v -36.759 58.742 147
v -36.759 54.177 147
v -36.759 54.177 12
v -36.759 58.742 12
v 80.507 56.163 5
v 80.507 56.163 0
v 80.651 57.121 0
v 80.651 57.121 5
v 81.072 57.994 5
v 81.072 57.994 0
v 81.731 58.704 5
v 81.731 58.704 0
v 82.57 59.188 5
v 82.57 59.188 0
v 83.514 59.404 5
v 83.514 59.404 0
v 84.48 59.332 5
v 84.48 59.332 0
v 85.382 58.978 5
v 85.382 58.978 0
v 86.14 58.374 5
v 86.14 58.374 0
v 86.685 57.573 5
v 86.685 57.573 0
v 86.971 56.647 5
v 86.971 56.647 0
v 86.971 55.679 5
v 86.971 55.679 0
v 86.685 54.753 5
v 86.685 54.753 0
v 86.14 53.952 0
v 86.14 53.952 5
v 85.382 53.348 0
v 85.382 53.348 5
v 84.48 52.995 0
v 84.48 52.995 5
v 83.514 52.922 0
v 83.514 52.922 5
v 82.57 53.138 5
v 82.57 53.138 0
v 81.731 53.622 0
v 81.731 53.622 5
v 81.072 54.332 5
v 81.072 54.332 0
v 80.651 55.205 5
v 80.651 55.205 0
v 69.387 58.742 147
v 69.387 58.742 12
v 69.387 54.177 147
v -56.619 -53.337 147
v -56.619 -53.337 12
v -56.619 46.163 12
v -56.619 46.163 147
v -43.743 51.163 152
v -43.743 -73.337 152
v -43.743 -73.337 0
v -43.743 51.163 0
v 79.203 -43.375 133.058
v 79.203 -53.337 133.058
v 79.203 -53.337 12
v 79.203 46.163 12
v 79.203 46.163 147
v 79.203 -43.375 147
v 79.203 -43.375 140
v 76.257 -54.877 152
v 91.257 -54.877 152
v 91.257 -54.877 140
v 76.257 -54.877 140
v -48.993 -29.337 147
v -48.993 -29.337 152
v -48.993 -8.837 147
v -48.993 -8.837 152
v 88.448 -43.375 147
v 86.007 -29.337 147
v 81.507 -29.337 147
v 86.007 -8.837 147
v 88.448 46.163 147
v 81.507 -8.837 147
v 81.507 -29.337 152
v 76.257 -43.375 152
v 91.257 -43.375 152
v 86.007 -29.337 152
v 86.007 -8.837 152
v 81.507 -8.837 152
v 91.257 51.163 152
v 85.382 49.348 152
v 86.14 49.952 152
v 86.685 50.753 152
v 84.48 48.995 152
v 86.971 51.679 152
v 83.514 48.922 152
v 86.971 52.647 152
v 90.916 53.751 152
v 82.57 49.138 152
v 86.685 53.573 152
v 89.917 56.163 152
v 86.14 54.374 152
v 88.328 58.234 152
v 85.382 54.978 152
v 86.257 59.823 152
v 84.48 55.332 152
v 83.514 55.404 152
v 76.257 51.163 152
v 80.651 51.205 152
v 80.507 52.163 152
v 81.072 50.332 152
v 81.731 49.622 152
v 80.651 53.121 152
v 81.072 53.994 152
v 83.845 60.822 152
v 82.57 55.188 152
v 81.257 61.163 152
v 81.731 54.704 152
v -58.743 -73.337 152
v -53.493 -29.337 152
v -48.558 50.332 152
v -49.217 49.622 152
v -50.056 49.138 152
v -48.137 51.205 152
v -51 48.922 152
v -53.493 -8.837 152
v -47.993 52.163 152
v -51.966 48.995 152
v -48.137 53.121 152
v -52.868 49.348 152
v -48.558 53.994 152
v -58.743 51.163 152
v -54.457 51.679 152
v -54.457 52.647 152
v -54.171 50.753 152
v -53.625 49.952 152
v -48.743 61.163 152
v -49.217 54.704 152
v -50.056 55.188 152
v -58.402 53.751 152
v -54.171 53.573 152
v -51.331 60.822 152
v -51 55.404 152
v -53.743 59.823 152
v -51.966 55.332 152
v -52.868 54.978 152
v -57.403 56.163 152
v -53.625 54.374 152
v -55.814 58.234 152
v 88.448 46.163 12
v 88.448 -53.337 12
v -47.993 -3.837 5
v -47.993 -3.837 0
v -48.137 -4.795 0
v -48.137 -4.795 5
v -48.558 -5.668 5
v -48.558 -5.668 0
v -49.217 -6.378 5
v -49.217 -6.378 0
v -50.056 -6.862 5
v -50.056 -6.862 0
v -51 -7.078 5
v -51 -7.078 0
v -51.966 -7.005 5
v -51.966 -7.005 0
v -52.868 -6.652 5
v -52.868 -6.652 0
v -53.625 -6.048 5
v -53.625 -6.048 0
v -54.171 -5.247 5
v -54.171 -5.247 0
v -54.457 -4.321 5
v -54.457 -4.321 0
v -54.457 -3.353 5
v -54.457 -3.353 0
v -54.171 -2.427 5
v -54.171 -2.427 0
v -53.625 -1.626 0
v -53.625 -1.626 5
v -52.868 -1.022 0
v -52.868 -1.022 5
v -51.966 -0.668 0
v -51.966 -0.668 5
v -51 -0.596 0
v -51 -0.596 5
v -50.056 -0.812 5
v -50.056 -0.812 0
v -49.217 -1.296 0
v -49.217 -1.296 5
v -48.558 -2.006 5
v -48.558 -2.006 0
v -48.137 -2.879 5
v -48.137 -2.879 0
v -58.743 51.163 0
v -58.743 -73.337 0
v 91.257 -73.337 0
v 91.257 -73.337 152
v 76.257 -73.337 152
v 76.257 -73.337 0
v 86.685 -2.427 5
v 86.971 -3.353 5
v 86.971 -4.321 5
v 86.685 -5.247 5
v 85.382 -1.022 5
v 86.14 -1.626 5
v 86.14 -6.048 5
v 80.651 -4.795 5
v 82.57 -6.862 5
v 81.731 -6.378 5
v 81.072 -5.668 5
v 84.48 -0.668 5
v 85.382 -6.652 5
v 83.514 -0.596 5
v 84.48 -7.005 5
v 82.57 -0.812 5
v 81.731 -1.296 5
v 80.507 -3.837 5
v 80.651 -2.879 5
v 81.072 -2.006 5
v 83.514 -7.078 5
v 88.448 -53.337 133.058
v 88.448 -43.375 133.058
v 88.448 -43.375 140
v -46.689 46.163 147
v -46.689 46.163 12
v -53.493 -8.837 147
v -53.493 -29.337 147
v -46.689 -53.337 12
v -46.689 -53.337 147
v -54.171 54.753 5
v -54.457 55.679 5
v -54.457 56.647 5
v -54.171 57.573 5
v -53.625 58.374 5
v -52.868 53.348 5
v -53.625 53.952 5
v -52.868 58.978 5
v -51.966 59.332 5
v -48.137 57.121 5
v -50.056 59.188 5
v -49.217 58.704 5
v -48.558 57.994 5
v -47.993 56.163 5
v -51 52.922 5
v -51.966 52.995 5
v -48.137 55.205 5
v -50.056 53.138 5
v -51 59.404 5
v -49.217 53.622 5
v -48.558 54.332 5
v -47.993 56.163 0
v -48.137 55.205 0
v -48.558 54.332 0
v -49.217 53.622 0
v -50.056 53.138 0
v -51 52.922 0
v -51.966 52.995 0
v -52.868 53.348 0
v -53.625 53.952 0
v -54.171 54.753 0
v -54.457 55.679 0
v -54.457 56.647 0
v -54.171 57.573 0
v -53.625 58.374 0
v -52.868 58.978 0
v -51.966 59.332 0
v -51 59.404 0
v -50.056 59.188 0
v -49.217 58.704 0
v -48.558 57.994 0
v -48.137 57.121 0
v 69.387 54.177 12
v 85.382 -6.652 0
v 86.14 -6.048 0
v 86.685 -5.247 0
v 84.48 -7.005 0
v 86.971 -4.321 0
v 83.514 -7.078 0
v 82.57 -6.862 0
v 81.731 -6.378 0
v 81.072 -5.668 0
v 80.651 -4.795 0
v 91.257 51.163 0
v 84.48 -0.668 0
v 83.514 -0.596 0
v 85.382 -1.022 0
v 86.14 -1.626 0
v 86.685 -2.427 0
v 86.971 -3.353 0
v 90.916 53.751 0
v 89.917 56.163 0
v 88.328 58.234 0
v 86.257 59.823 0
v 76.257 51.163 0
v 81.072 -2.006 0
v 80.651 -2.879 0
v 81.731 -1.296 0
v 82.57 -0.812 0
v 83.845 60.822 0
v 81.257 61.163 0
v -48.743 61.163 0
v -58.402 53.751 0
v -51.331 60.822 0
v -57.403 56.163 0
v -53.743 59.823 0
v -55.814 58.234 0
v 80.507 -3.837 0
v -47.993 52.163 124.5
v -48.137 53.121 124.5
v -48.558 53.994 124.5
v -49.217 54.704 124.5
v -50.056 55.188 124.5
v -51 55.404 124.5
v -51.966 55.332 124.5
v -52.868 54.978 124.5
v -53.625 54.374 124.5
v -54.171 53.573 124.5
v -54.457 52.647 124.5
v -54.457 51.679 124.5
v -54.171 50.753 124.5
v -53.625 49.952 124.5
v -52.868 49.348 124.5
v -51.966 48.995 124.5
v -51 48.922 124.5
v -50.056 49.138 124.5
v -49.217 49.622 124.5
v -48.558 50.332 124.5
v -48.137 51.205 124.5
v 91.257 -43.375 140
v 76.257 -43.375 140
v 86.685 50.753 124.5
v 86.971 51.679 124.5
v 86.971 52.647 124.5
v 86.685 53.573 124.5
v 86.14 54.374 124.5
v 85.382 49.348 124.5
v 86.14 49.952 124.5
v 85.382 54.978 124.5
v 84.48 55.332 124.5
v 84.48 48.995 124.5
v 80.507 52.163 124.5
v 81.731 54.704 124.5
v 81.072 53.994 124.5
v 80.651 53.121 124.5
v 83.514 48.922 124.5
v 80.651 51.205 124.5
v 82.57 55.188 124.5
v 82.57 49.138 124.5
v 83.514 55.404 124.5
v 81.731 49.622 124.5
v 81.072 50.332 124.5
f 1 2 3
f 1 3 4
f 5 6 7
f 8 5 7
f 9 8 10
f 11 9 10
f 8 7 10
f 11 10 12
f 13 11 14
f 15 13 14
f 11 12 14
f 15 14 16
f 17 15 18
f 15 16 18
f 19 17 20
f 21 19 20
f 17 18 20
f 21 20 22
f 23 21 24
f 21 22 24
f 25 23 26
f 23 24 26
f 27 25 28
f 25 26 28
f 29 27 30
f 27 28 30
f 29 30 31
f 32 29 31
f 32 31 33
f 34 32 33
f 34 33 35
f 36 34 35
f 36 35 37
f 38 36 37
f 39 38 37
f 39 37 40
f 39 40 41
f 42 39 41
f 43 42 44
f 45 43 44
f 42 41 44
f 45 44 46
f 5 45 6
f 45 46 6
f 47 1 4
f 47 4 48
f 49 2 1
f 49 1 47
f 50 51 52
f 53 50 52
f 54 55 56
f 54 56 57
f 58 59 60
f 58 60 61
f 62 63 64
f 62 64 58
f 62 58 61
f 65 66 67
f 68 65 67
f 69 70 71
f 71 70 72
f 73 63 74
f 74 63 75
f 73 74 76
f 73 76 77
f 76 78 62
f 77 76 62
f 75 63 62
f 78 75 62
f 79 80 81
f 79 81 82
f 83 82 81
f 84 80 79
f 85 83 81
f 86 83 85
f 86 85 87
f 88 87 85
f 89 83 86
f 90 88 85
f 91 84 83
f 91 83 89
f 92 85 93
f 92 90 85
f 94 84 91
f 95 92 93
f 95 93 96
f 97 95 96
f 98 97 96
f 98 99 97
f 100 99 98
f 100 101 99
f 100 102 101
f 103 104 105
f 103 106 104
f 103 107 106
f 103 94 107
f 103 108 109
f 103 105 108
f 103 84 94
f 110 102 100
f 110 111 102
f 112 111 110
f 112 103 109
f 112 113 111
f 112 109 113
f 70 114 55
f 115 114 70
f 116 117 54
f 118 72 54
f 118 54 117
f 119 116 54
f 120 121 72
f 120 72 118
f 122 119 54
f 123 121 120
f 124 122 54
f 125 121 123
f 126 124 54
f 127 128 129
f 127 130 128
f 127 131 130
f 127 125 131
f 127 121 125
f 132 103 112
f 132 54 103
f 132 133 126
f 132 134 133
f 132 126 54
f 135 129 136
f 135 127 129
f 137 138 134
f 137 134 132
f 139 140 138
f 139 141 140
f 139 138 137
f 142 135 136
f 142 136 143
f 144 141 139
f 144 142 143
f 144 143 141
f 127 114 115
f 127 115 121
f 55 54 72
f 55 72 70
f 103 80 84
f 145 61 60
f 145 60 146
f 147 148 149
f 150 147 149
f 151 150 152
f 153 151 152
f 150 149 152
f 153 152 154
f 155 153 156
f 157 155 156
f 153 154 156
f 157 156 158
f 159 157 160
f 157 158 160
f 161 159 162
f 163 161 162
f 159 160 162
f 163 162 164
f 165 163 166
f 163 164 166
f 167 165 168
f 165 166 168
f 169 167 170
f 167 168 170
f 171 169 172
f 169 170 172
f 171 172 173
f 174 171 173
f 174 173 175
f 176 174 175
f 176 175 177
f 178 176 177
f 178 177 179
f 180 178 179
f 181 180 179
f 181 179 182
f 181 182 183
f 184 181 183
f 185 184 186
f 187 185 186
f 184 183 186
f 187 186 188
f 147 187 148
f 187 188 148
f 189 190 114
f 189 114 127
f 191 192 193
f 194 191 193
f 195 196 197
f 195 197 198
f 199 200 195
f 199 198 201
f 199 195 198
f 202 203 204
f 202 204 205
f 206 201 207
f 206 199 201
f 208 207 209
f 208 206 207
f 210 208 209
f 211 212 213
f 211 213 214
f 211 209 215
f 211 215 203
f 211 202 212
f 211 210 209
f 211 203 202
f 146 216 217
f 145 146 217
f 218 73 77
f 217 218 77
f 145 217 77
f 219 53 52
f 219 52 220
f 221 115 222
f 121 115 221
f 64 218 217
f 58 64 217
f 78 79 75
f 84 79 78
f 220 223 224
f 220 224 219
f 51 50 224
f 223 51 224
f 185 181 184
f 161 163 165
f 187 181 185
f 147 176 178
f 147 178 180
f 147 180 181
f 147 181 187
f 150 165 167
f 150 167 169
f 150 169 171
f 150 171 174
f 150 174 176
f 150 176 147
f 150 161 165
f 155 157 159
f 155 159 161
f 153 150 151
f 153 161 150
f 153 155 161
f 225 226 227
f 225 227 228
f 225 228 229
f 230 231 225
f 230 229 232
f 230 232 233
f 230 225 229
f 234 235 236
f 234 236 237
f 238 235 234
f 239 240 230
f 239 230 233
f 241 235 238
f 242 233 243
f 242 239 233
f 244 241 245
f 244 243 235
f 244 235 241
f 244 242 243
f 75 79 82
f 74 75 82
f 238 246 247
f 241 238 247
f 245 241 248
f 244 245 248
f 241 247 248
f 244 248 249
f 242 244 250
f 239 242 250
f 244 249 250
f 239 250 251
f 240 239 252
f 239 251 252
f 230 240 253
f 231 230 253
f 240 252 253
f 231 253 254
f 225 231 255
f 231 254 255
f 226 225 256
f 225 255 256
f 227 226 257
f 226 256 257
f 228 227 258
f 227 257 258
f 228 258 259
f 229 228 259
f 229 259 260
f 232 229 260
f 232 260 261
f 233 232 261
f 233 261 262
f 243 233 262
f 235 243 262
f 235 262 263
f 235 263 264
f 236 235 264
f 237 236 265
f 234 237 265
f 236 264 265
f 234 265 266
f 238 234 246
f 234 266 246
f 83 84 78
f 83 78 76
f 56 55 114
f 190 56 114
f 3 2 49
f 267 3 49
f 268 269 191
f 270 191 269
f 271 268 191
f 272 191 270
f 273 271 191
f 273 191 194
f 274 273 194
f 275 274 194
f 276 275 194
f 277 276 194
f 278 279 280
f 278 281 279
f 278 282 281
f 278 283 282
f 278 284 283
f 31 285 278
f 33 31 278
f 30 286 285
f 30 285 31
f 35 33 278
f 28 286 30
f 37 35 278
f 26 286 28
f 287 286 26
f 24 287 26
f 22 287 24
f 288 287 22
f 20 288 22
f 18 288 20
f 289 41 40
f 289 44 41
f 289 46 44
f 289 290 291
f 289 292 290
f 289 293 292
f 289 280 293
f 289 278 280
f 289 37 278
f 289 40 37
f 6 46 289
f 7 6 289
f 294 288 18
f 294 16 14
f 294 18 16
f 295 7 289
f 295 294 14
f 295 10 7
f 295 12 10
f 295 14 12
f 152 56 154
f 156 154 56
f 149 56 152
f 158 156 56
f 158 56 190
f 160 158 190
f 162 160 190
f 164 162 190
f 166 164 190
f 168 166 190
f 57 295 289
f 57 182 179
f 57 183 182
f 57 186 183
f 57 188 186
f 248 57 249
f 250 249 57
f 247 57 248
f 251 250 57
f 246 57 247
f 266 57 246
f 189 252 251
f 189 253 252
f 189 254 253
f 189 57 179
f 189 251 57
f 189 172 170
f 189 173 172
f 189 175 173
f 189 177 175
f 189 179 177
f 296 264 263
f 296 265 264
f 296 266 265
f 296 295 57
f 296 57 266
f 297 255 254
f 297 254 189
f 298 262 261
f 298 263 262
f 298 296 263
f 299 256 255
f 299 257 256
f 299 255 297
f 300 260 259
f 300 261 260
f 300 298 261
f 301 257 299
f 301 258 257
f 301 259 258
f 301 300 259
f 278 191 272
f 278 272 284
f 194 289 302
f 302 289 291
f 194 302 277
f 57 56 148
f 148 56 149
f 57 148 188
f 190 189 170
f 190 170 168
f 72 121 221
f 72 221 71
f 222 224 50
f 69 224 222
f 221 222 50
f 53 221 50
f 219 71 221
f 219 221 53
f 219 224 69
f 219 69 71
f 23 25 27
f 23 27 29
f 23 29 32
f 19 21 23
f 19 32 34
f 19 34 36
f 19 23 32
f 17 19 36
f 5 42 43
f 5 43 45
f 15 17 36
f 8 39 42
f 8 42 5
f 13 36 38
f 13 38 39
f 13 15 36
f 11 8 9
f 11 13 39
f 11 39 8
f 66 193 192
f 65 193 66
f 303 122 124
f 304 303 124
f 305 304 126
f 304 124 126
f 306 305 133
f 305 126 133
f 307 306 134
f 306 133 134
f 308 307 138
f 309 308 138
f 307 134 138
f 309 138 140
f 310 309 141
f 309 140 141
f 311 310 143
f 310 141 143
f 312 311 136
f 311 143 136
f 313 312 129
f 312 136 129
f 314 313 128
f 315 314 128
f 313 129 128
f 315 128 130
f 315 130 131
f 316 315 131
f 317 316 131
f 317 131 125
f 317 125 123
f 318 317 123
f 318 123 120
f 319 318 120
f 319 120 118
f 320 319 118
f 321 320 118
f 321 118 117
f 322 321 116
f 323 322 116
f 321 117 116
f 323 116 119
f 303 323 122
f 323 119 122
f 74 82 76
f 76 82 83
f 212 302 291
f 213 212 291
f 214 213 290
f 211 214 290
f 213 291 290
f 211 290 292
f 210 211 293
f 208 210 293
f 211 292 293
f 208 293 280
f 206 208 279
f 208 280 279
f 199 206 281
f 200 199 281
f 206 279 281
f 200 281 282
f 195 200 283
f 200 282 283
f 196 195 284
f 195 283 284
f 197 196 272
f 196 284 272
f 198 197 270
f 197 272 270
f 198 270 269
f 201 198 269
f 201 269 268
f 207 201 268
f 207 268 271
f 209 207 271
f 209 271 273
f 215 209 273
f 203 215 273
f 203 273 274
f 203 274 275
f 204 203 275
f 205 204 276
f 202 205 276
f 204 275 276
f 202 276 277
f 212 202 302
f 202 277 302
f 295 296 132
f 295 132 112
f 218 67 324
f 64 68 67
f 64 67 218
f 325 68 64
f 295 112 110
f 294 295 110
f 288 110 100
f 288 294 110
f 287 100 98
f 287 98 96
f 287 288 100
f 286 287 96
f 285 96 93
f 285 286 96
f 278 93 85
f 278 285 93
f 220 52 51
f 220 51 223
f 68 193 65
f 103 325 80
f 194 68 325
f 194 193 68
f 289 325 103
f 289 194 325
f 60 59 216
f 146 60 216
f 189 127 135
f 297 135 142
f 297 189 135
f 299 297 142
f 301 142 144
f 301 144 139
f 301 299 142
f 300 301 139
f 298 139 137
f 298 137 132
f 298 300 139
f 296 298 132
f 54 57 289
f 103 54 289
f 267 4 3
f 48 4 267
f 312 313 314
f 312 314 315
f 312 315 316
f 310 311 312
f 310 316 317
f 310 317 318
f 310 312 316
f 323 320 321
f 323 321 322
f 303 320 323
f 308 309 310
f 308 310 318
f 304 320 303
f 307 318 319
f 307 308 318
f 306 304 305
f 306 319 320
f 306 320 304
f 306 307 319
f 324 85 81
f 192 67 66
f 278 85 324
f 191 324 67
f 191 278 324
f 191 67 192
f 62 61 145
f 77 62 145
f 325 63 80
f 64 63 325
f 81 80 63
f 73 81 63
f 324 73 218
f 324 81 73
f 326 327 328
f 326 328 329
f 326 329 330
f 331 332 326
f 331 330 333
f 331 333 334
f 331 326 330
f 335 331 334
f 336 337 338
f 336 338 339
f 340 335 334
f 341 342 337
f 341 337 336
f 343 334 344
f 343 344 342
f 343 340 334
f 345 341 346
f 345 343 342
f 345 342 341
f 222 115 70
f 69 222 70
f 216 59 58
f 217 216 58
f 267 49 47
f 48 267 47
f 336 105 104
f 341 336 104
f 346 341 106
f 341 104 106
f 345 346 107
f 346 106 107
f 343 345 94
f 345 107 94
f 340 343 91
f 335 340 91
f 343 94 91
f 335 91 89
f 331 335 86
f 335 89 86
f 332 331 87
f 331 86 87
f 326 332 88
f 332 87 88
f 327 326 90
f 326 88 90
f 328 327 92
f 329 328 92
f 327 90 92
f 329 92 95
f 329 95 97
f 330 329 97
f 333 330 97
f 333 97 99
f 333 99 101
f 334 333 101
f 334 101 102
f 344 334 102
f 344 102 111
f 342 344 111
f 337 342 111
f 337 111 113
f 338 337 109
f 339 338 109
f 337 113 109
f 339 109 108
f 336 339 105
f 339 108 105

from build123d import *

# Parameters (mm, degrees)
SKETCH2_W           = 120
SKETCH2_H           = 114.5
BOSS_EXTRUDE1_DEPTH = 152
SKETCH3_R           = 3.25
CUT_EXTRUDE1_DEPTH  = 27.5
SKETCH4_W           = 120
SKETCH4_H           = 10.090135052
CUT_EXTRUDE2_DEPTH  = 192.859758942
SKETCH5_W           = 9.929816524
SKETCH5_H           = 99.5
SKETCH5_W_2         = 106.146314573
SKETCH5_H_2         = 4.565432885
SKETCH5_W_3         = 9.245001591
CUT_EXTRUDE3_DEPTH  = 140
SKETCH6_W           = 5
SKETCH6_H           = 99.5
BOSS_EXTRUDE2_DEPTH = 10
SKETCH7_W           = 106.146314573
SKETCH7_H           = 5
BOSS_EXTRUDE3_DEPTH = 6
SKETCH8_W           = 5
SKETCH8_H           = 99.5
BOSS_EXTRUDE4_DEPTH = 10
SKETCH9_R           = 3.25
CUT_EXTRUDE4_DEPTH  = 5
SKETCH11_W          = 12
SKETCH11_H          = 11.501568892
CUT_EXTRUDE5_DEPTH  = 35
SKETCH12_W          = 6.942410631
SKETCH12_H          = 9.961568892
BOSS_EXTRUDE5_DEPTH = 9.5
SKETCH13_W          = 4.5
SKETCH13_H          = 20.5
CUT_EXTRUDE6_DEPTH  = 15


with BuildPart() as part:
    # Sketch2 → Boss-Extrude1 (new body)
    with BuildSketch(Plane.XY):
        with BuildLine():
            Line((-48.742911668, 61.163031625), (81.257088332, 61.163031625))
            ThreePointArc((81.257088332, 61.163031625), (88.328156143, 58.234099437), (91.257088332, 51.163031625))
            Line((91.257088332, 51.163031625), (91.257088332, -73.336968375))
            Line((91.257088332, -73.336968375), (-58.742911668, -73.336968375))
            Line((-58.742911668, -73.336968375), (-58.742911668, 51.163031625))
            ThreePointArc((-58.742911668, 51.163031625), (-55.81397948, 58.234099437), (-48.742911668, 61.163031625))
        make_face()
        with Locations((16.257088332, -6.086968375)):
            Rectangle(SKETCH2_W, SKETCH2_H, mode=Mode.SUBTRACT)
    extrude(amount=BOSS_EXTRUDE1_DEPTH)

    # Sketch3 → Cut-Extrude1 (cut)
    with BuildSketch(Plane.XY.offset(152)):
        with Locations((-51.242911668, 52.163031625)):
            Circle(SKETCH3_R)
        with Locations((83.757088332, 52.163031625)):
            Circle(SKETCH3_R)
    extrude(amount=-CUT_EXTRUDE1_DEPTH, mode=Mode.SUBTRACT)

    # Sketch4 → Cut-Extrude2 (cut, through all)
    with BuildSketch(Plane.XY.offset(152)):
        with Locations((16.257088332, -68.382035901)):
            Rectangle(SKETCH4_W, SKETCH4_H)
    extrude(amount=-CUT_EXTRUDE2_DEPTH, mode=Mode.SUBTRACT)

    # Sketch5 → Cut-Extrude3 (cut)
    with BuildSketch(Plane.XY.offset(152)):
        with Locations((-51.653725831, -3.586968375)):
            Rectangle(SKETCH5_W, SKETCH5_H)
        with Locations((16.314156243, 56.459462148)):
            Rectangle(SKETCH5_W_2, SKETCH5_H_2)
        with Locations((83.825495028, -3.586968375)):
            Rectangle(SKETCH5_W_3, SKETCH5_H)
    extrude(amount=-CUT_EXTRUDE3_DEPTH, mode=Mode.SUBTRACT)

    # Sketch6 → Boss-Extrude2 (add)
    with BuildSketch(Plane.ZY.offset(46.688817569)):
        with Locations((149.5, -3.586968375)):
            Rectangle(SKETCH6_W, SKETCH6_H)
    extrude(amount=BOSS_EXTRUDE2_DEPTH)

    # Sketch7 → Boss-Extrude3 (add)
    with BuildSketch(Plane(origin=(0, 54.176745705, 0), x_dir=(1, 0, 0), z_dir=(0, 1, 0))):
        with Locations((16.314156243, -149.5)):
            Rectangle(SKETCH7_W, SKETCH7_H)
    extrude(amount=BOSS_EXTRUDE3_DEPTH)

    # Sketch8 → Boss-Extrude4 (add)
    with BuildSketch(Plane(origin=(79.202994232, 0, 0), x_dir=(0, 0, -1), z_dir=(1, 0, 0))):
        with Locations((-149.5, -3.586968375)):
            Rectangle(SKETCH8_W, SKETCH8_H)
    extrude(amount=BOSS_EXTRUDE4_DEPTH)

    # Sketch9 → Cut-Extrude4 (cut)
    with BuildSketch(Plane(origin=(0, 0, 0), x_dir=(-1, 0, 0), z_dir=(0, 0, -1))):
        with Locations((-83.757088332, 56.163031625)):
            Circle(SKETCH9_R)
        with Locations((-83.757088332, -3.836968375)):
            Circle(SKETCH9_R)
        with Locations((51.242911668, -3.836968375)):
            Circle(SKETCH9_R)
        with Locations((51.242911668, 56.163031625)):
            Circle(SKETCH9_R)
    extrude(amount=-CUT_EXTRUDE4_DEPTH, mode=Mode.SUBTRACT)

    # Sketch11 → Cut-Extrude5 (cut)
    with BuildSketch(Plane(origin=(91.257088332, 0, 0), x_dir=(0, 0, -1), z_dir=(1, 0, 0))):
        with Locations((-146, -49.126183929)):
            Rectangle(SKETCH11_W, SKETCH11_H)
    extrude(amount=-CUT_EXTRUDE5_DEPTH, mode=Mode.SUBTRACT)

    # Sketch12 → Boss-Extrude5 (add)
    with BuildSketch(Plane(origin=(79.202994232, 0, 0), x_dir=(0, 0, -1), z_dir=(1, 0, 0))):
        with Locations((-136.528794684, -48.356183929)):
            Rectangle(SKETCH12_W, SKETCH12_H)
    extrude(amount=BOSS_EXTRUDE5_DEPTH)

    # Sketch13 → Cut-Extrude6 (cut)
    with BuildSketch(Plane.XY.offset(152)):
        with Locations((83.757088332, -19.086968375)):
            Rectangle(SKETCH13_W, SKETCH13_H)
        with Locations((-51.242911668, -19.086968375)):
            Rectangle(SKETCH13_W, SKETCH13_H)
    extrude(amount=-CUT_EXTRUDE6_DEPTH, mode=Mode.SUBTRACT)


solid = part.part
